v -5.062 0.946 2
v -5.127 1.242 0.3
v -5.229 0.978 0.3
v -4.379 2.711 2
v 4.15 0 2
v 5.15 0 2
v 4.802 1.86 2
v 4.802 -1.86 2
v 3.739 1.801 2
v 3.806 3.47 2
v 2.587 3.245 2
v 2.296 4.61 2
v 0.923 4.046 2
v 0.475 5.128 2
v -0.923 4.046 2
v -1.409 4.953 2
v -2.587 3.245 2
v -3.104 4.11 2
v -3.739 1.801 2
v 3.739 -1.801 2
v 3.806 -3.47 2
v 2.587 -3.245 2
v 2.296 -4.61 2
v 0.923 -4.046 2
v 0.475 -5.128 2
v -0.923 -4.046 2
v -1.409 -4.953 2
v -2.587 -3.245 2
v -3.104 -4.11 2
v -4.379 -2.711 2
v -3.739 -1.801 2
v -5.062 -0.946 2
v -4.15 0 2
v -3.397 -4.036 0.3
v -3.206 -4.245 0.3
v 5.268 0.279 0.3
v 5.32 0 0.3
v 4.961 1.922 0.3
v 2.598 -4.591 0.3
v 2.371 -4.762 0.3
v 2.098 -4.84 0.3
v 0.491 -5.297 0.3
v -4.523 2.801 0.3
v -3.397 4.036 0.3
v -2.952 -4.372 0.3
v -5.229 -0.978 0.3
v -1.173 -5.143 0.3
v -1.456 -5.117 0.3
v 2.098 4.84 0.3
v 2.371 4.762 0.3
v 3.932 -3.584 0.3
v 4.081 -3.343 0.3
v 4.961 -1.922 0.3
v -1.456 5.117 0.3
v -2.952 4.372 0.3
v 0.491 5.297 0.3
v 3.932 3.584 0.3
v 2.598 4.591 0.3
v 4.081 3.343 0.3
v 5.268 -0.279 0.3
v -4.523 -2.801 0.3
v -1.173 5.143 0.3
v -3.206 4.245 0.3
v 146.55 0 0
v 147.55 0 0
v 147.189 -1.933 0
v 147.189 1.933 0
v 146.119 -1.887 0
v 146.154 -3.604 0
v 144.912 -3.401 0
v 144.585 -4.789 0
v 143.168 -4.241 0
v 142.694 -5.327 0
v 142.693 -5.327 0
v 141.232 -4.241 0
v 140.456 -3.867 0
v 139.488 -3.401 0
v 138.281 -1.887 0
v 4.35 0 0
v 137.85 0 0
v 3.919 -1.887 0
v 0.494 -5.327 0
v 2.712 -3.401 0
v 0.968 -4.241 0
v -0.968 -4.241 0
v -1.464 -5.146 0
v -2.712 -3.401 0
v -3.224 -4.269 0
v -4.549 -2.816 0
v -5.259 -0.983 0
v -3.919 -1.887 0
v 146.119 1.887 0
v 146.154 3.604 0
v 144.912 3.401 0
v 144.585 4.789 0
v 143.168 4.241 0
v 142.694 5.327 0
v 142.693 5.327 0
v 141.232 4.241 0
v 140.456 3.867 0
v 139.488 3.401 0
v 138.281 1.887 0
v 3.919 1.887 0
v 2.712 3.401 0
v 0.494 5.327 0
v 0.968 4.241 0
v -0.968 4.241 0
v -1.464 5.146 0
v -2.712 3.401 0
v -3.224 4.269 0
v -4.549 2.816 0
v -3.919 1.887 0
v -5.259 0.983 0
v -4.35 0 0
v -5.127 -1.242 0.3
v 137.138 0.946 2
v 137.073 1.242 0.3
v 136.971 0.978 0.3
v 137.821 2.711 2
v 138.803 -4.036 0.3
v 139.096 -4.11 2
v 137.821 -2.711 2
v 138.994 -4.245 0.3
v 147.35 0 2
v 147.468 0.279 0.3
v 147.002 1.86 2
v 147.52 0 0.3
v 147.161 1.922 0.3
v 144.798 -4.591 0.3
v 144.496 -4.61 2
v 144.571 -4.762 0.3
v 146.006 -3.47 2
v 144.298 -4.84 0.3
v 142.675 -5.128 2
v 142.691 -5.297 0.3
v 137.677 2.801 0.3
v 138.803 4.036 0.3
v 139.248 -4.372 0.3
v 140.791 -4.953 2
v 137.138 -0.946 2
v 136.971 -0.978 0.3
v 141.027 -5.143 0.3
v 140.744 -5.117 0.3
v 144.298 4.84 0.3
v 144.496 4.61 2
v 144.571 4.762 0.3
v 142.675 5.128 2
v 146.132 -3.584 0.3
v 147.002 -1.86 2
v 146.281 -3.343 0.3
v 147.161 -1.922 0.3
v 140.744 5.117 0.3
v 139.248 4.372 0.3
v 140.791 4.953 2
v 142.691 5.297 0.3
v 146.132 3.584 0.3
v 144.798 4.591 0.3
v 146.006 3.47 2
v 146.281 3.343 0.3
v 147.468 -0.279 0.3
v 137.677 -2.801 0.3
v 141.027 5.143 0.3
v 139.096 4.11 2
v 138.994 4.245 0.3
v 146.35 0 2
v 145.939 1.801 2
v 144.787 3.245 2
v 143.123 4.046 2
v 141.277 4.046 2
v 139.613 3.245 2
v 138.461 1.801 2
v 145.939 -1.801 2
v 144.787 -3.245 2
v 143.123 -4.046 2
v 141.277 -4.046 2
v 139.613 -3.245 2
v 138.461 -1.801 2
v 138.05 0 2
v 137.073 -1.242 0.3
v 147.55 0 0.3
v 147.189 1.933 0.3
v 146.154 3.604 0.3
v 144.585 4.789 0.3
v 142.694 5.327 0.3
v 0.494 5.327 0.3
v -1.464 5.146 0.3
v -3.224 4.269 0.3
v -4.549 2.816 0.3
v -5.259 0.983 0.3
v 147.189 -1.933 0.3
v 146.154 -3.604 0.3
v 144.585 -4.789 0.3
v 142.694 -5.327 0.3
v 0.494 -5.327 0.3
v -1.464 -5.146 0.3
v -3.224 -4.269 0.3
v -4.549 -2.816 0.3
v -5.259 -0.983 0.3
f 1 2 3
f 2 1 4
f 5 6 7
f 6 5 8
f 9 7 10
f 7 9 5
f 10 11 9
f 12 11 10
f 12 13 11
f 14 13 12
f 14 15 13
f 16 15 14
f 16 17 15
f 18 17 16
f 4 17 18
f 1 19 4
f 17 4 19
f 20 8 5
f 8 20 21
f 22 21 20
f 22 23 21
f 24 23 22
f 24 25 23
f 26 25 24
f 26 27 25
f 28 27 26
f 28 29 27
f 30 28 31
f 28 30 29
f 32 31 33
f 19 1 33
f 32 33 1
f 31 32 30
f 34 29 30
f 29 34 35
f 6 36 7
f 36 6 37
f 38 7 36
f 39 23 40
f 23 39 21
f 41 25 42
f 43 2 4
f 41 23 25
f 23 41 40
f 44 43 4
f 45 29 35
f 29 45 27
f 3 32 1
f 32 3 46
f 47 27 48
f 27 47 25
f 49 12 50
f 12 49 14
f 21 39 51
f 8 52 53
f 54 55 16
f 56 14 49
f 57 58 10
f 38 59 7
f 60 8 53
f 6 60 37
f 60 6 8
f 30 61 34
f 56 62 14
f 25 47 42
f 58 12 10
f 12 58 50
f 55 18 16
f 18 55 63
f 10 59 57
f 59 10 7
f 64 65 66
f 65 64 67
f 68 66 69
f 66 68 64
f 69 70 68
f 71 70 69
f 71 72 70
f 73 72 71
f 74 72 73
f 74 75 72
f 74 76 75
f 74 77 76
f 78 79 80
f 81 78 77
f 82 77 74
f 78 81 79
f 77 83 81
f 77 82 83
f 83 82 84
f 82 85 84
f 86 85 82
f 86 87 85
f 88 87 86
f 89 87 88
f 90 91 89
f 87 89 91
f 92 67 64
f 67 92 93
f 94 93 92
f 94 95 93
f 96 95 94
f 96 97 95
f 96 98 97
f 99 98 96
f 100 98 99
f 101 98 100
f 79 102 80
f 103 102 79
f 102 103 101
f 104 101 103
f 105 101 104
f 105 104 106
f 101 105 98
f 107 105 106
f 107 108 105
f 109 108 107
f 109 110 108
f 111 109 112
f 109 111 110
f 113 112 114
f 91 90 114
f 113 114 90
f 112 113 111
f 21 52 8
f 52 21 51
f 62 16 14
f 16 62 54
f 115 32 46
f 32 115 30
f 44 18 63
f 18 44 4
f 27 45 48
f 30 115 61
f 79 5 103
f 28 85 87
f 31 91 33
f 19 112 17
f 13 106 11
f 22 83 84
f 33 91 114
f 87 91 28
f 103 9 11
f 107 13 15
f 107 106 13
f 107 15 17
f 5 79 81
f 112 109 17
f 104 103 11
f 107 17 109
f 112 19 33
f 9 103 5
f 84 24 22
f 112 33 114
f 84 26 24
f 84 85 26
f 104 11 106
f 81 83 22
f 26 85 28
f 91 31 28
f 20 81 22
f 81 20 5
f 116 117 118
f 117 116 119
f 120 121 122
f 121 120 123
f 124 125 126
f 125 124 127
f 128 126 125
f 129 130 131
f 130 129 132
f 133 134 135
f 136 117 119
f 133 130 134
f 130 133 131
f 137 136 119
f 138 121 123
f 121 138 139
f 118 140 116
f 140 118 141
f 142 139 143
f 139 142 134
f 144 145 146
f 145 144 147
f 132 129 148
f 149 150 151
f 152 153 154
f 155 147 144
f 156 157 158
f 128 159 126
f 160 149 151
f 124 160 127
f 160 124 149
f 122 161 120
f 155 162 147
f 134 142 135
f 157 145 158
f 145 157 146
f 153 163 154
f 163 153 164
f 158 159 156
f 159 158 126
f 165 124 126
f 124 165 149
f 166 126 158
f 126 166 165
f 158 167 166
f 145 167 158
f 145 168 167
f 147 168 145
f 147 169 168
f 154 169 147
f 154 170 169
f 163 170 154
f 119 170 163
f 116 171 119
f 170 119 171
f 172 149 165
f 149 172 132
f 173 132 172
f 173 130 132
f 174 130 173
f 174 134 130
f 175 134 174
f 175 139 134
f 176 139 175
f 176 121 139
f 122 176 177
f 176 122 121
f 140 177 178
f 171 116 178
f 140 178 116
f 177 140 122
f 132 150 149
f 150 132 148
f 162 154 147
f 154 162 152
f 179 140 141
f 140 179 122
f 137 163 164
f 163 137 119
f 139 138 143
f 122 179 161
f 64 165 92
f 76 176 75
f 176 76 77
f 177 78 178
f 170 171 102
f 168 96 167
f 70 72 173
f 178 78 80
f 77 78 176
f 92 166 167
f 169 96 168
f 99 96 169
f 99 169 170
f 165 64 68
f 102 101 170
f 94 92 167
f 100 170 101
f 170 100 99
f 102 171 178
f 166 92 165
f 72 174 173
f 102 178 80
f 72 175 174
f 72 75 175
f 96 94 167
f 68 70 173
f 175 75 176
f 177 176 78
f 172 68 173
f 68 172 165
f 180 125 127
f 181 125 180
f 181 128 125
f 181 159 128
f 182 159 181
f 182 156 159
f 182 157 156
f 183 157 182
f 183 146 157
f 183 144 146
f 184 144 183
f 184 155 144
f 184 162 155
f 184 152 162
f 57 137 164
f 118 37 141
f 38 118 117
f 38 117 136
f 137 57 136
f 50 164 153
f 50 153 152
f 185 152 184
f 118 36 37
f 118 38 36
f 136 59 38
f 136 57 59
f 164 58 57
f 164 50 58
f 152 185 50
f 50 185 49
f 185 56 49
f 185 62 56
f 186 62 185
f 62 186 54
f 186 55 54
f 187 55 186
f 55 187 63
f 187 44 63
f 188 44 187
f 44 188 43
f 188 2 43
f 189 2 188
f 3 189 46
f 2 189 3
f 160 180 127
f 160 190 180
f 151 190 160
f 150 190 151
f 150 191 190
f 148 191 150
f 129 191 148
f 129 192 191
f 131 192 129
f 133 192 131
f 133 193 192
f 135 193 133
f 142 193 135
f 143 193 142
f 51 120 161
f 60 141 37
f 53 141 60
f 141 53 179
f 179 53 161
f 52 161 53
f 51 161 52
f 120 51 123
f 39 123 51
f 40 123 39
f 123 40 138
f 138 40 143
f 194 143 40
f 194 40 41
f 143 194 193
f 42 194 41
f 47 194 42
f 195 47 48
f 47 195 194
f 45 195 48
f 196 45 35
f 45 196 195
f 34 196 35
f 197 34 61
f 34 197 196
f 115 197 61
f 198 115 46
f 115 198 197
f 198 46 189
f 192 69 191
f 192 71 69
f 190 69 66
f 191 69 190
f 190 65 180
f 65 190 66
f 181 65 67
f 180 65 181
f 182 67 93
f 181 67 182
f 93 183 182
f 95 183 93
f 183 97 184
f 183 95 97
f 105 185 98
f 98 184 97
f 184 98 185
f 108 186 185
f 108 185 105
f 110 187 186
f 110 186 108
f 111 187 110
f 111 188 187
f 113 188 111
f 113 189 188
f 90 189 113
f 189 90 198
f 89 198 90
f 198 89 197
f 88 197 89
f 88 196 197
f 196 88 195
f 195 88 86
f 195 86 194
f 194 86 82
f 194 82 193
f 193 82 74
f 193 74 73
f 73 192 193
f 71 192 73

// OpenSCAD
// 8.7
// 133.5

linear_extrude(height=0.3) difference() {
    hull() {
        circle(d=8.7+2);
        translate([133.5+8.7, 0]) circle(d=8.7+2);
    }
    circle(d=8.7);
    translate([133.5+8.7, 0]) circle(d=8.7);
}

difference() {
    cylinder(h=2, d2=8.3+2, d1=8.7+2);
    cylinder(h=2, d2=8.3, d1=8.7);
}

translate([133.5+8.7, 0]) difference() {
    cylinder(h=2, d2=8.3+2, d1=8.7+2);
    cylinder(h=2, d2=8.3, d1=8.7);
}
